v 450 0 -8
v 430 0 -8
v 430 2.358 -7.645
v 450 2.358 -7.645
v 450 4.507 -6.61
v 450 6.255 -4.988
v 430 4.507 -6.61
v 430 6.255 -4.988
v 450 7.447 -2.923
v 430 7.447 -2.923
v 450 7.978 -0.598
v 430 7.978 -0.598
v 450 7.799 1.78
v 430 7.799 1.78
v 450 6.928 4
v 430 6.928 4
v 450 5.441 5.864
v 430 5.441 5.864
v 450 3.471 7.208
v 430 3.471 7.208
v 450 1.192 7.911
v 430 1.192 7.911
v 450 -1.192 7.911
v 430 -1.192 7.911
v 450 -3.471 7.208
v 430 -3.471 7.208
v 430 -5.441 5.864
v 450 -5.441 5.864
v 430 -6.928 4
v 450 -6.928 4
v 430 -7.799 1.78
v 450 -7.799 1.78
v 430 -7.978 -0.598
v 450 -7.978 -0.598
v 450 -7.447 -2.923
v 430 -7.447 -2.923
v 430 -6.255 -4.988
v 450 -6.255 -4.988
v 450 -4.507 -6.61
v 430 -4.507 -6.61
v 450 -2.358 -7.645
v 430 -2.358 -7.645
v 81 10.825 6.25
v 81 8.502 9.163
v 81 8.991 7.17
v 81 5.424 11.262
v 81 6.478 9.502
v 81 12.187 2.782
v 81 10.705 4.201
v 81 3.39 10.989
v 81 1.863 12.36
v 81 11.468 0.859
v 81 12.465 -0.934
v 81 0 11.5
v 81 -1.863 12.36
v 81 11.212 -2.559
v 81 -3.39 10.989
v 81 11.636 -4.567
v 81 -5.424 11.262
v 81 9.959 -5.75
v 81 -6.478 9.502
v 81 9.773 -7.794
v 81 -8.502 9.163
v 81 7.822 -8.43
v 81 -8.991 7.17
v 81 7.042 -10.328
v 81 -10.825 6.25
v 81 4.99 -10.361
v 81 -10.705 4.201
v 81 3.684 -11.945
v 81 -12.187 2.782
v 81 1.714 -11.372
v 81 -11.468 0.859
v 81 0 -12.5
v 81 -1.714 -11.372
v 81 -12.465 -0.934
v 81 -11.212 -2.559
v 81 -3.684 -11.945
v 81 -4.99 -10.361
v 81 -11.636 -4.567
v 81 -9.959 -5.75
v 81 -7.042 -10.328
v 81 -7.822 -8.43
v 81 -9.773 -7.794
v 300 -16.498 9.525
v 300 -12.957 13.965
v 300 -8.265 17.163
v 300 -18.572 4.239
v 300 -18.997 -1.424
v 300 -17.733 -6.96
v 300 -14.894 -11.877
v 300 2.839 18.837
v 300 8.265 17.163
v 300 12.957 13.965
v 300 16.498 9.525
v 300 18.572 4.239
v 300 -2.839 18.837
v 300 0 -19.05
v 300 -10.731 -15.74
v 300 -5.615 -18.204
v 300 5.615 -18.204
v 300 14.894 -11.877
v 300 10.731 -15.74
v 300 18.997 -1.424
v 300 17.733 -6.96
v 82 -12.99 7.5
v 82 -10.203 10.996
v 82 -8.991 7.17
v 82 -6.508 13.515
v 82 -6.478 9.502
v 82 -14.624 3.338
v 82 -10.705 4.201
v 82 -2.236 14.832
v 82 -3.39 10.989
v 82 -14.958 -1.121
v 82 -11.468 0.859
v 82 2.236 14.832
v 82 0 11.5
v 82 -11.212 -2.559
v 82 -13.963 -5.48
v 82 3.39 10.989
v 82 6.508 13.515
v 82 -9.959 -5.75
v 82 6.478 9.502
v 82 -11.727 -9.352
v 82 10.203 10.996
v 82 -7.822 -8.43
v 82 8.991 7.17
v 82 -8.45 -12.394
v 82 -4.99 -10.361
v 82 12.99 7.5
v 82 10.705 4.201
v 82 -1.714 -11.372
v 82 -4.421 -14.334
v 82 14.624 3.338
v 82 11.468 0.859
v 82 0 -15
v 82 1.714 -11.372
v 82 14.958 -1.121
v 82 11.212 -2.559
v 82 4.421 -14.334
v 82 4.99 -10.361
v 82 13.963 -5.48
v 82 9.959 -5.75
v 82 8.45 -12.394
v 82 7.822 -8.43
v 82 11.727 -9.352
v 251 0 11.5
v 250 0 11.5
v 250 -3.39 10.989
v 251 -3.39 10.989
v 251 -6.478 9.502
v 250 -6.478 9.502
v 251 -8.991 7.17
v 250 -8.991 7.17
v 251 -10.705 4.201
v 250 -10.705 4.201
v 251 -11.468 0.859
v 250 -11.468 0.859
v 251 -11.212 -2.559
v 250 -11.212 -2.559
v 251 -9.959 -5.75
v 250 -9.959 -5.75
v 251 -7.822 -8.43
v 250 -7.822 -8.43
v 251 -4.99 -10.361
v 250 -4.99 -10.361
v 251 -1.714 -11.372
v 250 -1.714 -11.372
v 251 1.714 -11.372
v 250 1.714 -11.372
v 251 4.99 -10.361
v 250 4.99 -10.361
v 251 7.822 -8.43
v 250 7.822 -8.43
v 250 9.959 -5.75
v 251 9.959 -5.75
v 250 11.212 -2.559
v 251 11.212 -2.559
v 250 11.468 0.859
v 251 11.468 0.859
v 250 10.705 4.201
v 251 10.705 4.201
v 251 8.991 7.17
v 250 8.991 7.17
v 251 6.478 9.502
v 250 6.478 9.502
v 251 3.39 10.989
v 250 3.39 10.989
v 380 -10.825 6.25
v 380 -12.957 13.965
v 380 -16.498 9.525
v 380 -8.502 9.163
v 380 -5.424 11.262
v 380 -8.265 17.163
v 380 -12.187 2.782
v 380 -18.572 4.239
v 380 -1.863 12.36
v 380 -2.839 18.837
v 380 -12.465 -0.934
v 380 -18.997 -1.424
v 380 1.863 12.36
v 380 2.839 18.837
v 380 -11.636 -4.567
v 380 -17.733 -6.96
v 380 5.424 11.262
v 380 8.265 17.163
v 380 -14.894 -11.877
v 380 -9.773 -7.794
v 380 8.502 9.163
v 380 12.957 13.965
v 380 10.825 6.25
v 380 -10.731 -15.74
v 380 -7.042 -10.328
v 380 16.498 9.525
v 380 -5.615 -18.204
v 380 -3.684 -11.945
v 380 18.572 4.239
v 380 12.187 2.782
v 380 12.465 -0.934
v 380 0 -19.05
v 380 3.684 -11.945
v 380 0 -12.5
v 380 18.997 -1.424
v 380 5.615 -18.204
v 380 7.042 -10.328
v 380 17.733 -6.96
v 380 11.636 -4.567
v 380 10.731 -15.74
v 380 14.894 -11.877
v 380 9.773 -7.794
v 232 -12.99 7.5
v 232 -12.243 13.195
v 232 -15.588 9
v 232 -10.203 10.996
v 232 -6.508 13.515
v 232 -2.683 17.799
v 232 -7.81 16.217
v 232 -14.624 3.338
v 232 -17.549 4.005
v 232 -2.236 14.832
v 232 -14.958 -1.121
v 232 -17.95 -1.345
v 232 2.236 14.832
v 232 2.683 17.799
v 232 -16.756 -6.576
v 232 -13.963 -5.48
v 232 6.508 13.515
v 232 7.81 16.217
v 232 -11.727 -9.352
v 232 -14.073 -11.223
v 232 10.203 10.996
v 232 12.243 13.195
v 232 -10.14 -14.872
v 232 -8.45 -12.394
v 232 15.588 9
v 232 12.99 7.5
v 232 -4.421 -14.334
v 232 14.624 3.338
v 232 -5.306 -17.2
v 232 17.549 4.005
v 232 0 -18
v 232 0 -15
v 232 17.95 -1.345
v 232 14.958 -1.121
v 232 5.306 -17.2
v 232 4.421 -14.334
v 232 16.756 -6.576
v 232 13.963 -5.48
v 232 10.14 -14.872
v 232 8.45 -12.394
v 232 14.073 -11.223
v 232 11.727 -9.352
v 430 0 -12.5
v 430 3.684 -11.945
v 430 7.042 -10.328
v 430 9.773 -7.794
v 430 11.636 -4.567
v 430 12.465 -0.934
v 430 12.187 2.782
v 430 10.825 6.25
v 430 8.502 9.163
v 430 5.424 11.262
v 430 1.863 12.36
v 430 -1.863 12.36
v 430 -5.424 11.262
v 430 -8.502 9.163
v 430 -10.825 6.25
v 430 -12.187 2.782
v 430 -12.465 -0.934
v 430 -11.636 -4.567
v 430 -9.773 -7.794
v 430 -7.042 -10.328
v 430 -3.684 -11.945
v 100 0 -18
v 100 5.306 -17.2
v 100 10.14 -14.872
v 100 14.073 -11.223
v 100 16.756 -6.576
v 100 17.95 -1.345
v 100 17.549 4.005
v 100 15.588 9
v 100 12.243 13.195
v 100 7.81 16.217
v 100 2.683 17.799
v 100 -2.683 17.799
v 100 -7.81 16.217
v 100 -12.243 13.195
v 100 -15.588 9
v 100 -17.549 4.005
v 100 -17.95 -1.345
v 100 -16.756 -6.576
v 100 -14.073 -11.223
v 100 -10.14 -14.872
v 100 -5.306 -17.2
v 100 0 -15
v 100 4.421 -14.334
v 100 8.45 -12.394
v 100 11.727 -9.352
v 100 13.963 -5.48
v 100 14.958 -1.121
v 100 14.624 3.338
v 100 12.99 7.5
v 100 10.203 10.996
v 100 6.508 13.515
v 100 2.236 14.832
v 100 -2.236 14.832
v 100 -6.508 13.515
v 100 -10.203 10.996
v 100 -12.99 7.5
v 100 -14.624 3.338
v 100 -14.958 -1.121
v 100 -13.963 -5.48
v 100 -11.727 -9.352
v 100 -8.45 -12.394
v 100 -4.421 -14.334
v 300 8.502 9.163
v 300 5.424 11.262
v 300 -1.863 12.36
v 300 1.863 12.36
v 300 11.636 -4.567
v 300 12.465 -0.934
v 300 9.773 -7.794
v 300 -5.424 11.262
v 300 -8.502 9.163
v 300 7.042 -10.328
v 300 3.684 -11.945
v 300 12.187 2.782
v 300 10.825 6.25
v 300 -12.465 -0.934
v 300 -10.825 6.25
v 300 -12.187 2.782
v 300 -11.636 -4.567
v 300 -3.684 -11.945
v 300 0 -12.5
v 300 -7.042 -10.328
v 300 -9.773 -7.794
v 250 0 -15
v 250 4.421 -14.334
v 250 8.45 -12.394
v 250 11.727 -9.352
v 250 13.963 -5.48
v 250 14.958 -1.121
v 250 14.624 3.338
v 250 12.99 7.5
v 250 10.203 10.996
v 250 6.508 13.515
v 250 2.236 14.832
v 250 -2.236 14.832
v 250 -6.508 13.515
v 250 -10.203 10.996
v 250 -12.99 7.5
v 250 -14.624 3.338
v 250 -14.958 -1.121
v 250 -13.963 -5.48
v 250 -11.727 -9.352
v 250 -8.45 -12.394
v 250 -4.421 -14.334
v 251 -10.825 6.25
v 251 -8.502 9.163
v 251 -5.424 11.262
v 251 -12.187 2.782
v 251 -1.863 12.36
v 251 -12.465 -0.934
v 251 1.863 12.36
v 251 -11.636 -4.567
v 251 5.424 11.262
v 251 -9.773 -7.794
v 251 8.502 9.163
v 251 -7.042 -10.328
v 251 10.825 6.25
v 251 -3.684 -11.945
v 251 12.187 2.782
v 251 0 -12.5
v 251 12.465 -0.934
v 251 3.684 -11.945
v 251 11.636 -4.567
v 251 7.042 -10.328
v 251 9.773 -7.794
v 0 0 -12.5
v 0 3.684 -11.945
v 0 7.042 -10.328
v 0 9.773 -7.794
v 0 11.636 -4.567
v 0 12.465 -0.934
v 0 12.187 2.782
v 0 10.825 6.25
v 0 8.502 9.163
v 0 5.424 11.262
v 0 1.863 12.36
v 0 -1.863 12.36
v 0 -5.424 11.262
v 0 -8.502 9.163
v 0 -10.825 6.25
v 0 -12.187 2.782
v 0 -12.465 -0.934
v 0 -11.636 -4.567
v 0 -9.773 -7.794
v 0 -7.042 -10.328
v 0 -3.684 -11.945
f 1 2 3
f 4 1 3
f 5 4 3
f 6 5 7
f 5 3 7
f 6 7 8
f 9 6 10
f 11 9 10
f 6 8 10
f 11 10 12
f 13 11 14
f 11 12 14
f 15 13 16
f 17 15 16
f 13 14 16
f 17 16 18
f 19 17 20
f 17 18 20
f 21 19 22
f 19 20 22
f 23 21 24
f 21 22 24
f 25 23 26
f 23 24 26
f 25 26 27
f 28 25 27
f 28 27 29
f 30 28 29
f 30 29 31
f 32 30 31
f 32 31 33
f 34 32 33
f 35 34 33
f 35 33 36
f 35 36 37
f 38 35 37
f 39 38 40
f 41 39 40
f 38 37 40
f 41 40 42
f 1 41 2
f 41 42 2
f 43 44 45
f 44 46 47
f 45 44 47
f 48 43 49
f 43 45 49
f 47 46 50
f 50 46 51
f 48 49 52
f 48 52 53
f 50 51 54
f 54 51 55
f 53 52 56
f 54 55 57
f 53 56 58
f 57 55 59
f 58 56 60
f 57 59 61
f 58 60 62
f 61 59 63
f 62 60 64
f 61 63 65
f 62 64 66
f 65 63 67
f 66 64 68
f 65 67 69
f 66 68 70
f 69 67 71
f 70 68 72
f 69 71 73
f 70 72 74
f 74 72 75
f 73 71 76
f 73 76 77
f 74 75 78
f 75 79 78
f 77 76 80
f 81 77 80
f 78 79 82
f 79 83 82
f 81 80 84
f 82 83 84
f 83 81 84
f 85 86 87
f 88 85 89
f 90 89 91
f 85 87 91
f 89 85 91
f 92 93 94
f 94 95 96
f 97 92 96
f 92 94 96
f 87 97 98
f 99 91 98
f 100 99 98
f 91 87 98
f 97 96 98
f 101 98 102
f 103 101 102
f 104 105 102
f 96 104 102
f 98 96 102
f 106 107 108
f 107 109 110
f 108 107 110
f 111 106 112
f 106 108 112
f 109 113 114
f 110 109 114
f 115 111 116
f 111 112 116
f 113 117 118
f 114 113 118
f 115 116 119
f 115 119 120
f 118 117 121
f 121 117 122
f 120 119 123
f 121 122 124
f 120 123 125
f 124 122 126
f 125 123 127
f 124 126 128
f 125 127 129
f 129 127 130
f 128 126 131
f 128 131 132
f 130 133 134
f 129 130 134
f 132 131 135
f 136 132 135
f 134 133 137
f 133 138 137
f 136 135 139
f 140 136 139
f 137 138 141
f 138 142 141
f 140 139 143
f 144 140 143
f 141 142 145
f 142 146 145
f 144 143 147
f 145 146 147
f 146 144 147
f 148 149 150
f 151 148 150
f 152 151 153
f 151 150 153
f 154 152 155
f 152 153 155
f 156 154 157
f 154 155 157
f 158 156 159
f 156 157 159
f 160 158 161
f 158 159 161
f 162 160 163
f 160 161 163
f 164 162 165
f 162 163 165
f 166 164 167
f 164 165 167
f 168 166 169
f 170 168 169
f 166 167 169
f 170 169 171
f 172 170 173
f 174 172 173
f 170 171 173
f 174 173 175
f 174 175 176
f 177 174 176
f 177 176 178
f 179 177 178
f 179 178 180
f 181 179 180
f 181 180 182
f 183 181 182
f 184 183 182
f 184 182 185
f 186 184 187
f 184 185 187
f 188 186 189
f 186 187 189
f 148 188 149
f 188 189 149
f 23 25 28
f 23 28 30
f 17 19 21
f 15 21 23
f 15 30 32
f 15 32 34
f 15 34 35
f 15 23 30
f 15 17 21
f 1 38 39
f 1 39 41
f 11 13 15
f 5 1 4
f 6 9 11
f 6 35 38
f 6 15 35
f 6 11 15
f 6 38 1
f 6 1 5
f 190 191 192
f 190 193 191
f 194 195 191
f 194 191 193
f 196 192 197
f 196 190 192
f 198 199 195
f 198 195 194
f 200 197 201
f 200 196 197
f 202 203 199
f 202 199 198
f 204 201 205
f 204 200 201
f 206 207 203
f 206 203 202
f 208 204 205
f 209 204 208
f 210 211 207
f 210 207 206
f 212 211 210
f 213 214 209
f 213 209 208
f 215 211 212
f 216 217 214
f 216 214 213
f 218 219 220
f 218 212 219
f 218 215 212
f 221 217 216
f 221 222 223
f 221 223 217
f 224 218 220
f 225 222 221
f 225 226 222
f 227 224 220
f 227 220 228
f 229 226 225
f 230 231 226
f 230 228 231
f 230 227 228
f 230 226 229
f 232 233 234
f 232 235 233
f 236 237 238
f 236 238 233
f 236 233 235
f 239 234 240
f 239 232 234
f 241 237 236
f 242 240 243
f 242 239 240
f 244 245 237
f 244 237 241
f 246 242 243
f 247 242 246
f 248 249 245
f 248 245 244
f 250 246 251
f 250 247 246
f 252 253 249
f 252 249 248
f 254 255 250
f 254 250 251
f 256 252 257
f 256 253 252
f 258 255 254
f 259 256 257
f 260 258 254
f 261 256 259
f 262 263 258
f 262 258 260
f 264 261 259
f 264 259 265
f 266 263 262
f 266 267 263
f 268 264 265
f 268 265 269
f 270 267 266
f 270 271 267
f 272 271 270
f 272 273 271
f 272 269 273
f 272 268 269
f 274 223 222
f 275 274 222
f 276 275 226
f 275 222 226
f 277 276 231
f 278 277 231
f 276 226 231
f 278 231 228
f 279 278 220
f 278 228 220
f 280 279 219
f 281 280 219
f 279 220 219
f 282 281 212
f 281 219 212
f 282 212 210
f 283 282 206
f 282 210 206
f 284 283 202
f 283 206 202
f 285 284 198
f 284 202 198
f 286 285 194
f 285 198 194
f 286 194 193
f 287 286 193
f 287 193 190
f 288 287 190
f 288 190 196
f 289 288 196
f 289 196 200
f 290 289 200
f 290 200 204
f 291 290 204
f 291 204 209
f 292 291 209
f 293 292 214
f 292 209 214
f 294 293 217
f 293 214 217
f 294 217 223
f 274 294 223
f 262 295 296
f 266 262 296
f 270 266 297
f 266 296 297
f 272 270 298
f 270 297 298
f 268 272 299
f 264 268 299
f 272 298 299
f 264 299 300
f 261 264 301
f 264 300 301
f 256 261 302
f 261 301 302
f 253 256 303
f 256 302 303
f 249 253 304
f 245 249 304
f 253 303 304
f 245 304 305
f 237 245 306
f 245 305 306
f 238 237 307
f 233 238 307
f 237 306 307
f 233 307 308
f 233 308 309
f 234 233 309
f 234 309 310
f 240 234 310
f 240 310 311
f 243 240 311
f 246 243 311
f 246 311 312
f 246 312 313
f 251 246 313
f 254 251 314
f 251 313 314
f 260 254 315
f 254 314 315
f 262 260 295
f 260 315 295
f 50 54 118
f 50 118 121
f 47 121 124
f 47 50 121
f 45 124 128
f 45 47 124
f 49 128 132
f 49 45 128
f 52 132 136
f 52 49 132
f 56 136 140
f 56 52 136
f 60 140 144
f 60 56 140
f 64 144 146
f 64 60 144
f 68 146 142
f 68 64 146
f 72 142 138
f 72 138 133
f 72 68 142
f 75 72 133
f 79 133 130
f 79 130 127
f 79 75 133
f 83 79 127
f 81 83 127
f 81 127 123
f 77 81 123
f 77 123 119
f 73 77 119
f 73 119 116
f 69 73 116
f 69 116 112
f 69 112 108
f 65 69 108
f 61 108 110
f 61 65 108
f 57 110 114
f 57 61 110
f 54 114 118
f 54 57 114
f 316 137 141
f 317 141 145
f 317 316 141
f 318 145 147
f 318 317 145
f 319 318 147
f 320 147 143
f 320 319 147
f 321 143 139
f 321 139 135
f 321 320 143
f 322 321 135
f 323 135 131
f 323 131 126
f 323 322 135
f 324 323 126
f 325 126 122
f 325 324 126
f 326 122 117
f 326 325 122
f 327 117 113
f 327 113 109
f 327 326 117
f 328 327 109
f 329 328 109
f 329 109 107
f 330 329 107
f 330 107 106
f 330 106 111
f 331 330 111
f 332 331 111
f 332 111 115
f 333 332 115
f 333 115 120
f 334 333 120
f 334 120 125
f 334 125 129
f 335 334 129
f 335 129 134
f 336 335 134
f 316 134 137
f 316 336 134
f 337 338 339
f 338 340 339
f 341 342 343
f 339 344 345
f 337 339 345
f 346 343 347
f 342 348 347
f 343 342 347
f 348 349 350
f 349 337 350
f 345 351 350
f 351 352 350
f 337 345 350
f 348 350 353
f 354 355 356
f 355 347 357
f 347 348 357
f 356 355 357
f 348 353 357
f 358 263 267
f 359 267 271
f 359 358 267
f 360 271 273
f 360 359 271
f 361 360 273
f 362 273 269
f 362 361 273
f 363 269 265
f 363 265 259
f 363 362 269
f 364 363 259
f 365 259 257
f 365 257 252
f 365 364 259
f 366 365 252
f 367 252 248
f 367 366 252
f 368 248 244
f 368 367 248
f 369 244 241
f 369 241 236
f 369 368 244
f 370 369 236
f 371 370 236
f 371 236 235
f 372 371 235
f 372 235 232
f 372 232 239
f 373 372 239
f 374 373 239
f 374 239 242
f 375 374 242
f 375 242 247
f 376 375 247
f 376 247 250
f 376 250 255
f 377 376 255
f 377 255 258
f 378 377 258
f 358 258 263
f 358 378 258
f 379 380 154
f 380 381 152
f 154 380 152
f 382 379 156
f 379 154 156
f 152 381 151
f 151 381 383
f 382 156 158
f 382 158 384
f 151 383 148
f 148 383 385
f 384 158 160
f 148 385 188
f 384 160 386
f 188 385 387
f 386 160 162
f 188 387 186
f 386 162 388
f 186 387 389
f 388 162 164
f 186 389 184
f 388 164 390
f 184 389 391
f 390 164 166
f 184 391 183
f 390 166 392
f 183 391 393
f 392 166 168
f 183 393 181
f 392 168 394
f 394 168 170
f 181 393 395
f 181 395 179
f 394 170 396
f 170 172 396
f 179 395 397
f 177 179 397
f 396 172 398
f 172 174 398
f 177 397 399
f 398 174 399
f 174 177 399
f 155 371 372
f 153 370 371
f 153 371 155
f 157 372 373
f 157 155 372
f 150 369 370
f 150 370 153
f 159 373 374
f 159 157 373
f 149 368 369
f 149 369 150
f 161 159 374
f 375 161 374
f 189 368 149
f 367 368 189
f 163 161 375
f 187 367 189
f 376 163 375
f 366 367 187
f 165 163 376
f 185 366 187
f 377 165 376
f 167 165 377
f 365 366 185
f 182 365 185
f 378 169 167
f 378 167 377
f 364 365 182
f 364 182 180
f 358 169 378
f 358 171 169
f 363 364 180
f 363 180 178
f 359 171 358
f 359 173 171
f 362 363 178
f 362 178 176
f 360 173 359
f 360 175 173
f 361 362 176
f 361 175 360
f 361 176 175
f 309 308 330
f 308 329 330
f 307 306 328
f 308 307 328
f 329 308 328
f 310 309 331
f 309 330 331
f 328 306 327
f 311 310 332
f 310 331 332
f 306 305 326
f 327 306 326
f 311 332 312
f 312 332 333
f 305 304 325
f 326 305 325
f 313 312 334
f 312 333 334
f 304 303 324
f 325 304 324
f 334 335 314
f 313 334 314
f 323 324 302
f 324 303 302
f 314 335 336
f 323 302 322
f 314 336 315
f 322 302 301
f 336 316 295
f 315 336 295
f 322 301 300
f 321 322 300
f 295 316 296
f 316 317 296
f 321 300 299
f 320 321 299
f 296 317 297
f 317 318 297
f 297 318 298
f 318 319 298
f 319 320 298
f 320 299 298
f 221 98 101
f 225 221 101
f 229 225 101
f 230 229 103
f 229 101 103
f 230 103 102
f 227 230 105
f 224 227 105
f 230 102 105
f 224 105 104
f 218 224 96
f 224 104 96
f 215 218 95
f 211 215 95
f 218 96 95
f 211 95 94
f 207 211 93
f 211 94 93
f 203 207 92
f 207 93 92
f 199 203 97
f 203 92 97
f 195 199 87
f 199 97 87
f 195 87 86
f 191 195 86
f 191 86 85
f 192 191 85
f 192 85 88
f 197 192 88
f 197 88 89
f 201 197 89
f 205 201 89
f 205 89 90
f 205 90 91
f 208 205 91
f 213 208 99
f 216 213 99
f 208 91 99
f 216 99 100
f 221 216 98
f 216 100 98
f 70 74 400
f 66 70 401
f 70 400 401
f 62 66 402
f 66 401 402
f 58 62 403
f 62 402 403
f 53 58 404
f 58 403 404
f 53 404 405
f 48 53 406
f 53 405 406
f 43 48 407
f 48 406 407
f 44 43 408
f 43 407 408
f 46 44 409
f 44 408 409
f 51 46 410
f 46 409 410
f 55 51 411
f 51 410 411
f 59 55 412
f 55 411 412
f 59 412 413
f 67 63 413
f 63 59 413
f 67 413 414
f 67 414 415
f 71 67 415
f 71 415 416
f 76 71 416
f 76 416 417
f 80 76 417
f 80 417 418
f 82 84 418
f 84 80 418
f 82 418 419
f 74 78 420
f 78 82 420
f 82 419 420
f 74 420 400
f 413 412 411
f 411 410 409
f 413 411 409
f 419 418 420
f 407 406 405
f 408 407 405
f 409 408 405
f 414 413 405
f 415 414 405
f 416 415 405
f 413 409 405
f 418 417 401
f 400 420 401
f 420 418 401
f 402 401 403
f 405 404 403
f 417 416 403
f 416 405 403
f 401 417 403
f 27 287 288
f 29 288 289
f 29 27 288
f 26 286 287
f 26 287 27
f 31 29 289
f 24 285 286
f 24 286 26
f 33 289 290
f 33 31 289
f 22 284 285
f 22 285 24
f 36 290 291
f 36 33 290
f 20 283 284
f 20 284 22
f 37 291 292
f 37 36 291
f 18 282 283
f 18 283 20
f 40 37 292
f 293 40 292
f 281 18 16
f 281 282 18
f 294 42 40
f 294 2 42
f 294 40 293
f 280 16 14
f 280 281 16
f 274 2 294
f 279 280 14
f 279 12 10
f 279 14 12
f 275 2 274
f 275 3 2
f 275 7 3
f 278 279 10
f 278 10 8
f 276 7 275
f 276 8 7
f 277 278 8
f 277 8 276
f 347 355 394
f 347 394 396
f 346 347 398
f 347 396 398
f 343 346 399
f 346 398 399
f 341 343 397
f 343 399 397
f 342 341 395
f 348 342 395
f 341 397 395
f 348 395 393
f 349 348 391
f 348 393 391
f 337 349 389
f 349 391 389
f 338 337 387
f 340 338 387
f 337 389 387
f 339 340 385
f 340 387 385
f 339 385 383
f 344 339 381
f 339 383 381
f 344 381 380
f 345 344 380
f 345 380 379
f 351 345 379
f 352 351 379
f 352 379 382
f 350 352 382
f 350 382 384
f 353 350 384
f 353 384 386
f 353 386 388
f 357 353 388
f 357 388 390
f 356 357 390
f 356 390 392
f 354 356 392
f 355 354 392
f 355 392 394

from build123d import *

# Parameters (mm, degrees)
SKETCH_1_R          = 12.5
EXTRUDE_1_DEPTH     = 100
SKETCH_2_R          = 15
EXTRUDE_2_DEPTH     = 18
SKETCH_3_R          = 18
EXTRUDE_3_DEPTH     = 132
EXTRUDE_START       = 18
SKETCH_4_R          = 15
EXTRUDE_4_DEPTH     = 18
SKETCH_5_R          = 12.5
EXTRUDE_5_DEPTH     = 50
SKETCH_6_R          = 19.05
EXTRUDE_6_DEPTH     = 80
SKETCH_7_R          = 12.5
EXTRUDE_7_DEPTH     = 50
SKETCH_9_R          = 8
EXTRUDE_8_DEPTH     = 20
CUT_EXTRUDE_START   = 1
SKETCH_11_R         = 12.5
SKETCH_11_R_2       = 11.5
CUT_EXTRUDE_2_DEPTH = 1
SKETCH_12_R         = 12.5
SKETCH_12_R_2       = 11.5
CUT_EXTRUDE_3_DEPTH = 1


with BuildPart() as part:
    # 草图1 → 凸台-拉伸1 (new body)
    with BuildSketch(Plane(origin=(0, 0, 0), x_dir=(0, 0, -1), z_dir=(1, 0, 0))):
        Circle(SKETCH_1_R)
    extrude(amount=EXTRUDE_1_DEPTH)

    # 草图2 → 凸台-拉伸2 (add)
    with BuildSketch(Plane(origin=(100, 0, 0), x_dir=(0, 0, -1), z_dir=(1, 0, 0))):
        Circle(SKETCH_2_R)
    extrude(amount=-EXTRUDE_2_DEPTH)

    # 草图3 → 凸台-拉伸3 (add)
    with BuildSketch(Plane(origin=(100, 0, 0), x_dir=(0, 0, -1), z_dir=(1, 0, 0))):
        Circle(SKETCH_3_R)
    extrude(amount=EXTRUDE_3_DEPTH)

    # 草图4 → 凸台-拉伸4 (add)
    with BuildSketch(Plane(origin=(232, 0, 0), x_dir=(0, 0, -1), z_dir=(1, 0, 0)).offset(EXTRUDE_START)):
        Circle(SKETCH_4_R)
    extrude(amount=-EXTRUDE_4_DEPTH)

    # 草图5 → 凸台-拉伸5 (add)
    with BuildSketch(Plane(origin=(250, 0, 0), x_dir=(0, 0, -1), z_dir=(1, 0, 0))):
        Circle(SKETCH_5_R)
    extrude(amount=EXTRUDE_5_DEPTH)

    # 草图6 → 凸台-拉伸6 (add)
    with BuildSketch(Plane(origin=(300, 0, 0), x_dir=(0, 0, -1), z_dir=(1, 0, 0))):
        Circle(SKETCH_6_R)
    extrude(amount=EXTRUDE_6_DEPTH)

    # 草图7 → 凸台-拉伸7 (add)
    with BuildSketch(Plane(origin=(380, 0, 0), x_dir=(0, 0, -1), z_dir=(1, 0, 0))):
        Circle(SKETCH_7_R)
    extrude(amount=EXTRUDE_7_DEPTH)

    # 草图9 → 凸台-拉伸8 (add)
    with BuildSketch(Plane(origin=(430, 0, 0), x_dir=(0, 0, -1), z_dir=(1, 0, 0))):
        Circle(SKETCH_9_R)
    extrude(amount=EXTRUDE_8_DEPTH)


with BuildPart() as body_2:
    # Split Bodies 1: the piece on the far side of the plane
    add(part.part)
    split(bisect_by=Plane(origin=(300, 0, 0), x_dir=(0, 0, -1), z_dir=(-1, 0, 0)), keep=Keep.BOTTOM)


with BuildPart() as part_1:
    add(part.part)

    # Split Bodies 1
    split(bisect_by=Plane(origin=(300, 0, 0), x_dir=(0, 0, -1), z_dir=(-1, 0, 0)), keep=Keep.TOP)

    # 草图11 → 切除-拉伸2 (cut)
    with BuildSketch(Plane.ZY.offset(-82).offset(CUT_EXTRUDE_START)):
        with Locations(Location((0, 0, 0), (0, 0, 180))):
            Circle(SKETCH_11_R)
        Circle(SKETCH_11_R_2, mode=Mode.SUBTRACT)
    extrude(amount=-CUT_EXTRUDE_2_DEPTH, mode=Mode.SUBTRACT)

    # 草图12 → 切除-拉伸3 (cut)
    with BuildSketch(Plane(origin=(250, 0, 0), x_dir=(0, 0, -1), z_dir=(1, 0, 0))):
        Circle(SKETCH_12_R)
        with Locations(Location((0, 0, 0), (0, 0, 180))):
            Circle(SKETCH_12_R_2, mode=Mode.SUBTRACT)
    extrude(amount=CUT_EXTRUDE_3_DEPTH, mode=Mode.SUBTRACT)


solid = Compound([body_2.part, part_1.part])
